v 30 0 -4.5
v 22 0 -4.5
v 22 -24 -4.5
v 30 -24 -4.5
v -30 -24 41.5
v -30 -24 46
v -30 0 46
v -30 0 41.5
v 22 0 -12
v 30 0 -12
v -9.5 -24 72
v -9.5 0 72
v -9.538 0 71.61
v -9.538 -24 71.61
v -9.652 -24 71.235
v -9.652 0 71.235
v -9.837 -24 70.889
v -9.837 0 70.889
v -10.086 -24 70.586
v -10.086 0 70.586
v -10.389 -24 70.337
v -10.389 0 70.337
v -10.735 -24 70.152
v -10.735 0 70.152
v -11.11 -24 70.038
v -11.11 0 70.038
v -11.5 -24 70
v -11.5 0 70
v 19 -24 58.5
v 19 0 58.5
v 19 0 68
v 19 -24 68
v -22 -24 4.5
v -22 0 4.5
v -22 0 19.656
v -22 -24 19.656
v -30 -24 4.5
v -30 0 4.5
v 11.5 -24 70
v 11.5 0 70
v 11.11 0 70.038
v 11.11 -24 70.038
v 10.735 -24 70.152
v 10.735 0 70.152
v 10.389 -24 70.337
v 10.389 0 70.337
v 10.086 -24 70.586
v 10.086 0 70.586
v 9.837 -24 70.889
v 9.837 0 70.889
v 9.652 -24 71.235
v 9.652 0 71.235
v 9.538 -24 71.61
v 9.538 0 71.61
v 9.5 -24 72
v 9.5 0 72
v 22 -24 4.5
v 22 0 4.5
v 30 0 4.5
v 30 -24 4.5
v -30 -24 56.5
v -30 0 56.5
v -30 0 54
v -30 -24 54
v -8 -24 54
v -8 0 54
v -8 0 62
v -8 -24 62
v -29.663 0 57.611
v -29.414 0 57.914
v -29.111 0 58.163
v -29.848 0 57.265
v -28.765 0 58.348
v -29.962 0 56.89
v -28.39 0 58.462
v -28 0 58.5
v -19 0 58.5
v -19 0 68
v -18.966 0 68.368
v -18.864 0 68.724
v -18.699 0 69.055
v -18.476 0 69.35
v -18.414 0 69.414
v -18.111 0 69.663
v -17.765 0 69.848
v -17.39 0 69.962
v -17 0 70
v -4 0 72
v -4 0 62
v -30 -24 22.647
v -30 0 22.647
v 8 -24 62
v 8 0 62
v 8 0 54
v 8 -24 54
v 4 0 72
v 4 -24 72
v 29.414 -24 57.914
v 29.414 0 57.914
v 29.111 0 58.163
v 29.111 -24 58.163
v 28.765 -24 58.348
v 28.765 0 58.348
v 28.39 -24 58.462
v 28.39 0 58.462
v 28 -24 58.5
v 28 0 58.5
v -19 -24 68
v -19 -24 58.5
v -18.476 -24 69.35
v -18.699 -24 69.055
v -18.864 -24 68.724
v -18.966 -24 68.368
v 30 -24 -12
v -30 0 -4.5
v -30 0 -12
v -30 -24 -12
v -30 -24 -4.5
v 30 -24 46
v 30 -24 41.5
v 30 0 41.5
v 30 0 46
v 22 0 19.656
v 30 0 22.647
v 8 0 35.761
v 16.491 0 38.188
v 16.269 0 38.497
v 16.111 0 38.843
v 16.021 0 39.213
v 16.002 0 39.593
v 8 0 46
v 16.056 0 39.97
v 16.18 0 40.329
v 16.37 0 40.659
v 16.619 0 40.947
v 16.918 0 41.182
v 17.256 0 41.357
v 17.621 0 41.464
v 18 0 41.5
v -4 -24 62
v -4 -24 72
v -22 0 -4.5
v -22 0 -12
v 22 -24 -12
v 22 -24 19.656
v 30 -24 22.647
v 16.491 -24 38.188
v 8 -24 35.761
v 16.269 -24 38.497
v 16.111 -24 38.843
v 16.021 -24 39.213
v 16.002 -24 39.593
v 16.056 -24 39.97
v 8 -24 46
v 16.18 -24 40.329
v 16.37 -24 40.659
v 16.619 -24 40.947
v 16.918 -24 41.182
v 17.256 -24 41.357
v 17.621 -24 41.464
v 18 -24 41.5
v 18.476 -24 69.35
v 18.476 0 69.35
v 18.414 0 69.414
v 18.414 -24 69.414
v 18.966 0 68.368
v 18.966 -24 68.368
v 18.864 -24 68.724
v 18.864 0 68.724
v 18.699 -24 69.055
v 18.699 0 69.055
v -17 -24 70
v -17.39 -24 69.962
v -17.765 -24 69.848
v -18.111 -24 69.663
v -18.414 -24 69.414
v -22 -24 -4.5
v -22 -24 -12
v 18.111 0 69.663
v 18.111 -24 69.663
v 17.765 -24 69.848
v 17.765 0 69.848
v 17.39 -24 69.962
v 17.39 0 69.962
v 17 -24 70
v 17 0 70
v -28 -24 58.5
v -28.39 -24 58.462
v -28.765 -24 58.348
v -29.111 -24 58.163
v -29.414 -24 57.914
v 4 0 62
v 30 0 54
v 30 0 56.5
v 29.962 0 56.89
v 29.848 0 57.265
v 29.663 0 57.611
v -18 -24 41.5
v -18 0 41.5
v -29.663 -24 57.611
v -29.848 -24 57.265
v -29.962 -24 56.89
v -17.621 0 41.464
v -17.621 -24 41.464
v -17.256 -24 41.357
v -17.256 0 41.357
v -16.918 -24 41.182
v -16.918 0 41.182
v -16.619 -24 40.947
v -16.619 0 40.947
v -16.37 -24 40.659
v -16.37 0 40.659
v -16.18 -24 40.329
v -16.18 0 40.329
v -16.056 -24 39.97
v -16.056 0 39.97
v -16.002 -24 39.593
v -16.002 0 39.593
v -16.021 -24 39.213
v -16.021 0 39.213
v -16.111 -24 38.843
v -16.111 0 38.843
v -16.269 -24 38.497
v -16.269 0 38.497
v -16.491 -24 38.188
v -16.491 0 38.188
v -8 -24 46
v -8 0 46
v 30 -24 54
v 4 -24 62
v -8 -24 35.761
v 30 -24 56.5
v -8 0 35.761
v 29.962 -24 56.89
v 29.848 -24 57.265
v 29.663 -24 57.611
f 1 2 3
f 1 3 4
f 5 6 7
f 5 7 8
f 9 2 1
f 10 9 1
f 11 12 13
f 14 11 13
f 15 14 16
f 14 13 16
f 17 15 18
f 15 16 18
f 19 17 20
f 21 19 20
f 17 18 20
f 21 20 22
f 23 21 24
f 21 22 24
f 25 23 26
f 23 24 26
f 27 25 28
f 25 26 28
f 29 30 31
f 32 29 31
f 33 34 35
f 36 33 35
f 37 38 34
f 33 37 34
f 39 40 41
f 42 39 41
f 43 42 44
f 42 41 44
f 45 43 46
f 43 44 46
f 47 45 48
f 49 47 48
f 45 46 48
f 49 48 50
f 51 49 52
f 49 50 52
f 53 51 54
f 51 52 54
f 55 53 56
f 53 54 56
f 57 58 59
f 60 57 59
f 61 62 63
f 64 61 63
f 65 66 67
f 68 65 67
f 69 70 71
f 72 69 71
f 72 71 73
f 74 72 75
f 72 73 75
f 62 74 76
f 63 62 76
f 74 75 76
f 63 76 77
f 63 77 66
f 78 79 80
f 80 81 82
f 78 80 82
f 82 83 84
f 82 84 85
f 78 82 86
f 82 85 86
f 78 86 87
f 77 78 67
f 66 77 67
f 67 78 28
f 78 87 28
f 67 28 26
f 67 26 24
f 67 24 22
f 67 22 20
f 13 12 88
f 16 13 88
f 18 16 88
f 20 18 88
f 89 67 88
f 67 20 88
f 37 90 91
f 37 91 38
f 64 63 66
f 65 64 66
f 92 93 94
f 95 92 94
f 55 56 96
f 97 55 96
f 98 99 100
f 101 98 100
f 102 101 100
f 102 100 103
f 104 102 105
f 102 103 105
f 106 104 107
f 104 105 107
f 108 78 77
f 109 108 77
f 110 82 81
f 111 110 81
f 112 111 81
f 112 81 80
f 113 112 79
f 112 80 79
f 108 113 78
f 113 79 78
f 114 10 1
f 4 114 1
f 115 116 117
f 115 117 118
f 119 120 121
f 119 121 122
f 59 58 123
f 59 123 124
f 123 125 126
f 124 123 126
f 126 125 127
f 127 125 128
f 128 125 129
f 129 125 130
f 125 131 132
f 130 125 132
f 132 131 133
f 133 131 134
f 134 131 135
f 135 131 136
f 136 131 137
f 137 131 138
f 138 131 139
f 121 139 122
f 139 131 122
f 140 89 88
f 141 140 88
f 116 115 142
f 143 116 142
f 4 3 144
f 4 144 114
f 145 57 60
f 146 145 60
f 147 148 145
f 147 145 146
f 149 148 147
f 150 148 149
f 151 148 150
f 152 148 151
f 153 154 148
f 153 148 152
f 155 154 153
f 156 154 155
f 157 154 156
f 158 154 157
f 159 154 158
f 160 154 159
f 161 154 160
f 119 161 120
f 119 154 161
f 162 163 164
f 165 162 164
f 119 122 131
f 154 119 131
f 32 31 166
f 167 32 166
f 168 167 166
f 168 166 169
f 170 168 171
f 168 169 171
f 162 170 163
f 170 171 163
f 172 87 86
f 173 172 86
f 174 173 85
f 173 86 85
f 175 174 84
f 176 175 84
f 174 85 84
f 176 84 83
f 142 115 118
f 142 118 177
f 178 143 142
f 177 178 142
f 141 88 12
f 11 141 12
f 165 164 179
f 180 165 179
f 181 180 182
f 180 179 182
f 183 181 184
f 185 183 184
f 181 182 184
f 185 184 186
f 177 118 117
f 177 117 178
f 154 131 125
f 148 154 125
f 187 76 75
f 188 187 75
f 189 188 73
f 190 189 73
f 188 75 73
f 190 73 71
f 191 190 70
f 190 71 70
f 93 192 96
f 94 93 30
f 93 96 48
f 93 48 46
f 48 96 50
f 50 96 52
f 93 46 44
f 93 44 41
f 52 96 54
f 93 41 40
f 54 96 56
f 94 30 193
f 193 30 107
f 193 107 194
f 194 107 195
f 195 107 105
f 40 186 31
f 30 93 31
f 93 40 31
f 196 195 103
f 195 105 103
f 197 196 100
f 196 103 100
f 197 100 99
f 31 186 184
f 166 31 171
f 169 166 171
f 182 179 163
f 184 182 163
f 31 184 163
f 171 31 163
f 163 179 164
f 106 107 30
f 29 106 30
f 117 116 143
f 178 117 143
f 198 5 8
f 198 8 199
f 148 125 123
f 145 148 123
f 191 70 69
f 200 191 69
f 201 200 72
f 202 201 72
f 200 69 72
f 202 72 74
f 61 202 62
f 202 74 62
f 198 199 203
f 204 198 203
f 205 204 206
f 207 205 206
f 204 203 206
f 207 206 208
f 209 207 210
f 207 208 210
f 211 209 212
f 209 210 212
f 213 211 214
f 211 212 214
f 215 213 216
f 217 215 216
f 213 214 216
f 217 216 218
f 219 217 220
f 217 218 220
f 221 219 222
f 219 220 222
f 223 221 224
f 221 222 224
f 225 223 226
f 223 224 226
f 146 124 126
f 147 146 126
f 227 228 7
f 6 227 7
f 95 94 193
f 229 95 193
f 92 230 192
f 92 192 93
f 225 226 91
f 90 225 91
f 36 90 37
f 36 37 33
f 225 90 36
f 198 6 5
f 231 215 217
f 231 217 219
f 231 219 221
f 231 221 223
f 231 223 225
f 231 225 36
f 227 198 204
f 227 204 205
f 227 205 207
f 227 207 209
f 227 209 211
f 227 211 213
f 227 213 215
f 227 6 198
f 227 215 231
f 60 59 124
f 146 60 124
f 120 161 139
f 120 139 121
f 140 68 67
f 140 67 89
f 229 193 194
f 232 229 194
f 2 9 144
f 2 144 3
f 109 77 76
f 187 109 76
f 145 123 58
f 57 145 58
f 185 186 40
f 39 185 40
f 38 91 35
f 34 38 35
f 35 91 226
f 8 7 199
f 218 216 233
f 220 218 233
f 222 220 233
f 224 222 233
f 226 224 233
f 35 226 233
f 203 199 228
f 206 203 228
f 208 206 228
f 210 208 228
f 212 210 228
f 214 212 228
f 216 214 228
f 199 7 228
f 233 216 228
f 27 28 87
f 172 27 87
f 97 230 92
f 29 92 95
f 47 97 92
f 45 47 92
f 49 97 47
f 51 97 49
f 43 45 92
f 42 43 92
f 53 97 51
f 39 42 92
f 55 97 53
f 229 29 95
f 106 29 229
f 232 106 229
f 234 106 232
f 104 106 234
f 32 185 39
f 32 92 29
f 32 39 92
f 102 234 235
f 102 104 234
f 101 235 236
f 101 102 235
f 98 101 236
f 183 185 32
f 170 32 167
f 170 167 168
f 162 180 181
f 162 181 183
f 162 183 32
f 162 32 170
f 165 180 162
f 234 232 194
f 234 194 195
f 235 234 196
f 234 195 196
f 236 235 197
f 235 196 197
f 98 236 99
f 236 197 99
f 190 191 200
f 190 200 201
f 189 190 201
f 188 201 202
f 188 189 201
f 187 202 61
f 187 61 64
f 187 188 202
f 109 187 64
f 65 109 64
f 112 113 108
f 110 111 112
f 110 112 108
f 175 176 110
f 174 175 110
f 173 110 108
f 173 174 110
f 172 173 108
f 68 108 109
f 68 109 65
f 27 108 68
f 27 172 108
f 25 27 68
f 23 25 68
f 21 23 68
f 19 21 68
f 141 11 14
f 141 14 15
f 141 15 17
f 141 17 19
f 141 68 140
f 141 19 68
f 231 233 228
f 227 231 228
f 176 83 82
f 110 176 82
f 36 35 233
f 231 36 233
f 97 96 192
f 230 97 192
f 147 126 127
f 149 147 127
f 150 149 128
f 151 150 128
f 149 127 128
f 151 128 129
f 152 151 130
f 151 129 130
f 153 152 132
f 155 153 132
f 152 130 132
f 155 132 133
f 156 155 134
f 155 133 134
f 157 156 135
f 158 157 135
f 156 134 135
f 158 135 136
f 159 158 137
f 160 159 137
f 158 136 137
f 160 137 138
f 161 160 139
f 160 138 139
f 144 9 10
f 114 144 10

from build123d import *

# Parameters (mm, degrees)
F0_W     = 8
F0_H     = 7.5
F1_DEPTH = 24


with BuildPart() as f1:
    # F0 (on Front) → F1 (new body)
    with BuildSketch(Plane.XZ):
        with BuildLine():
            Line((-4, 62), (-4, 72))
            Line((-4, 72), (-9.5, 72))
            ThreePointArc((-9.5, 72), (-10.085786, 70.585786), (-11.5, 70))
            Line((-11.5, 70), (-17, 70))
            ThreePointArc((-17, 70), (-17.765367, 69.847759), (-18.414214, 69.414214))
            Line((-18.414214, 69.414214), (-18.47564, 69.349995))
            ThreePointArc((-18.47564, 69.349995), (-18.864307, 68.724127), (-19, 68))
            Line((-19, 68), (-19, 58.5))
            Line((-19, 58.5), (-8, 58.5))
            Line((-8, 58.5), (-8, 62))
            Line((-8, 62), (-4, 62))
        make_face()
        with BuildLine():
            Line((-8, 54), (-8, 58.5))
            Line((-8, 58.5), (-19, 58.5))
            Line((-19, 58.5), (-28, 58.5))
            ThreePointArc((-28, 58.5), (-28.765367, 58.347759), (-29.414214, 57.914214))
            ThreePointArc((-29.414214, 57.914214), (-29.847759, 57.265367), (-30, 56.5))
            Line((-30, 56.5), (-30, 54))
            Line((-30, 54), (-8, 54))
        make_face()
        with BuildLine():
            Line((-8, 35.761153), (-8, 46))
            Line((-8, 46), (-30, 46))
            Line((-30, 46), (-30, 41.5))
            Line((-30, 41.5), (-18, 41.5))
            ThreePointArc((-18, 41.5), (-16.180077, 40.329386), (-16.490581, 38.187882))
            Line((-16.490581, 38.187882), (-30, 22.647073))
            Line((-30, 22.647073), (-30, 4.5))
            Line((-30, 4.5), (-22, 4.5))
            Line((-22, 4.5), (-22, 19.655996))
            Line((-22, 19.655996), (-8, 35.761153))
        make_face()
        with Locations((-26, -8.25)):
            Rectangle(F0_W, F0_H)
        with Locations((26, -8.25)):
            Rectangle(F0_W, F0_H)
        with BuildLine():
            Line((30, 46), (8, 46))
            Line((8, 46), (8, 35.761153))
            Line((8, 35.761153), (22, 19.655996))
            Line((22, 19.655996), (22, 4.5))
            Line((22, 4.5), (30, 4.5))
            Line((30, 4.5), (30, 22.647073))
            Line((30, 22.647073), (16.490581, 38.187882))
            ThreePointArc((16.490581, 38.187882), (16.180077, 40.329386), (18, 41.5))
            Line((18, 41.5), (30, 41.5))
            Line((30, 41.5), (30, 46))
        make_face()
        with BuildLine():
            Line((19, 58.5), (8, 58.5))
            Line((8, 58.5), (8, 54))
            Line((8, 54), (30, 54))
            Line((30, 54), (30, 56.5))
            ThreePointArc((30, 56.5), (29.847759, 57.265367), (29.414214, 57.914214))
            ThreePointArc((29.414214, 57.914214), (28.765367, 58.347759), (28, 58.5))
            Line((28, 58.5), (19, 58.5))
        make_face()
        with BuildLine():
            Line((9.5, 72), (4, 72))
            Line((4, 72), (4, 62))
            Line((4, 62), (8, 62))
            Line((8, 62), (8, 58.5))
            Line((8, 58.5), (19, 58.5))
            Line((19, 58.5), (19, 68))
            ThreePointArc((19, 68), (18.864307, 68.724127), (18.47564, 69.349995))
            Line((18.47564, 69.349995), (18.414214, 69.414214))
            ThreePointArc((18.414214, 69.414214), (17.765367, 69.847759), (17, 70))
            Line((17, 70), (11.5, 70))
            ThreePointArc((11.5, 70), (10.085786, 70.585786), (9.5, 72))
        make_face()
    extrude(amount=F1_DEPTH)


solid = f1.part
